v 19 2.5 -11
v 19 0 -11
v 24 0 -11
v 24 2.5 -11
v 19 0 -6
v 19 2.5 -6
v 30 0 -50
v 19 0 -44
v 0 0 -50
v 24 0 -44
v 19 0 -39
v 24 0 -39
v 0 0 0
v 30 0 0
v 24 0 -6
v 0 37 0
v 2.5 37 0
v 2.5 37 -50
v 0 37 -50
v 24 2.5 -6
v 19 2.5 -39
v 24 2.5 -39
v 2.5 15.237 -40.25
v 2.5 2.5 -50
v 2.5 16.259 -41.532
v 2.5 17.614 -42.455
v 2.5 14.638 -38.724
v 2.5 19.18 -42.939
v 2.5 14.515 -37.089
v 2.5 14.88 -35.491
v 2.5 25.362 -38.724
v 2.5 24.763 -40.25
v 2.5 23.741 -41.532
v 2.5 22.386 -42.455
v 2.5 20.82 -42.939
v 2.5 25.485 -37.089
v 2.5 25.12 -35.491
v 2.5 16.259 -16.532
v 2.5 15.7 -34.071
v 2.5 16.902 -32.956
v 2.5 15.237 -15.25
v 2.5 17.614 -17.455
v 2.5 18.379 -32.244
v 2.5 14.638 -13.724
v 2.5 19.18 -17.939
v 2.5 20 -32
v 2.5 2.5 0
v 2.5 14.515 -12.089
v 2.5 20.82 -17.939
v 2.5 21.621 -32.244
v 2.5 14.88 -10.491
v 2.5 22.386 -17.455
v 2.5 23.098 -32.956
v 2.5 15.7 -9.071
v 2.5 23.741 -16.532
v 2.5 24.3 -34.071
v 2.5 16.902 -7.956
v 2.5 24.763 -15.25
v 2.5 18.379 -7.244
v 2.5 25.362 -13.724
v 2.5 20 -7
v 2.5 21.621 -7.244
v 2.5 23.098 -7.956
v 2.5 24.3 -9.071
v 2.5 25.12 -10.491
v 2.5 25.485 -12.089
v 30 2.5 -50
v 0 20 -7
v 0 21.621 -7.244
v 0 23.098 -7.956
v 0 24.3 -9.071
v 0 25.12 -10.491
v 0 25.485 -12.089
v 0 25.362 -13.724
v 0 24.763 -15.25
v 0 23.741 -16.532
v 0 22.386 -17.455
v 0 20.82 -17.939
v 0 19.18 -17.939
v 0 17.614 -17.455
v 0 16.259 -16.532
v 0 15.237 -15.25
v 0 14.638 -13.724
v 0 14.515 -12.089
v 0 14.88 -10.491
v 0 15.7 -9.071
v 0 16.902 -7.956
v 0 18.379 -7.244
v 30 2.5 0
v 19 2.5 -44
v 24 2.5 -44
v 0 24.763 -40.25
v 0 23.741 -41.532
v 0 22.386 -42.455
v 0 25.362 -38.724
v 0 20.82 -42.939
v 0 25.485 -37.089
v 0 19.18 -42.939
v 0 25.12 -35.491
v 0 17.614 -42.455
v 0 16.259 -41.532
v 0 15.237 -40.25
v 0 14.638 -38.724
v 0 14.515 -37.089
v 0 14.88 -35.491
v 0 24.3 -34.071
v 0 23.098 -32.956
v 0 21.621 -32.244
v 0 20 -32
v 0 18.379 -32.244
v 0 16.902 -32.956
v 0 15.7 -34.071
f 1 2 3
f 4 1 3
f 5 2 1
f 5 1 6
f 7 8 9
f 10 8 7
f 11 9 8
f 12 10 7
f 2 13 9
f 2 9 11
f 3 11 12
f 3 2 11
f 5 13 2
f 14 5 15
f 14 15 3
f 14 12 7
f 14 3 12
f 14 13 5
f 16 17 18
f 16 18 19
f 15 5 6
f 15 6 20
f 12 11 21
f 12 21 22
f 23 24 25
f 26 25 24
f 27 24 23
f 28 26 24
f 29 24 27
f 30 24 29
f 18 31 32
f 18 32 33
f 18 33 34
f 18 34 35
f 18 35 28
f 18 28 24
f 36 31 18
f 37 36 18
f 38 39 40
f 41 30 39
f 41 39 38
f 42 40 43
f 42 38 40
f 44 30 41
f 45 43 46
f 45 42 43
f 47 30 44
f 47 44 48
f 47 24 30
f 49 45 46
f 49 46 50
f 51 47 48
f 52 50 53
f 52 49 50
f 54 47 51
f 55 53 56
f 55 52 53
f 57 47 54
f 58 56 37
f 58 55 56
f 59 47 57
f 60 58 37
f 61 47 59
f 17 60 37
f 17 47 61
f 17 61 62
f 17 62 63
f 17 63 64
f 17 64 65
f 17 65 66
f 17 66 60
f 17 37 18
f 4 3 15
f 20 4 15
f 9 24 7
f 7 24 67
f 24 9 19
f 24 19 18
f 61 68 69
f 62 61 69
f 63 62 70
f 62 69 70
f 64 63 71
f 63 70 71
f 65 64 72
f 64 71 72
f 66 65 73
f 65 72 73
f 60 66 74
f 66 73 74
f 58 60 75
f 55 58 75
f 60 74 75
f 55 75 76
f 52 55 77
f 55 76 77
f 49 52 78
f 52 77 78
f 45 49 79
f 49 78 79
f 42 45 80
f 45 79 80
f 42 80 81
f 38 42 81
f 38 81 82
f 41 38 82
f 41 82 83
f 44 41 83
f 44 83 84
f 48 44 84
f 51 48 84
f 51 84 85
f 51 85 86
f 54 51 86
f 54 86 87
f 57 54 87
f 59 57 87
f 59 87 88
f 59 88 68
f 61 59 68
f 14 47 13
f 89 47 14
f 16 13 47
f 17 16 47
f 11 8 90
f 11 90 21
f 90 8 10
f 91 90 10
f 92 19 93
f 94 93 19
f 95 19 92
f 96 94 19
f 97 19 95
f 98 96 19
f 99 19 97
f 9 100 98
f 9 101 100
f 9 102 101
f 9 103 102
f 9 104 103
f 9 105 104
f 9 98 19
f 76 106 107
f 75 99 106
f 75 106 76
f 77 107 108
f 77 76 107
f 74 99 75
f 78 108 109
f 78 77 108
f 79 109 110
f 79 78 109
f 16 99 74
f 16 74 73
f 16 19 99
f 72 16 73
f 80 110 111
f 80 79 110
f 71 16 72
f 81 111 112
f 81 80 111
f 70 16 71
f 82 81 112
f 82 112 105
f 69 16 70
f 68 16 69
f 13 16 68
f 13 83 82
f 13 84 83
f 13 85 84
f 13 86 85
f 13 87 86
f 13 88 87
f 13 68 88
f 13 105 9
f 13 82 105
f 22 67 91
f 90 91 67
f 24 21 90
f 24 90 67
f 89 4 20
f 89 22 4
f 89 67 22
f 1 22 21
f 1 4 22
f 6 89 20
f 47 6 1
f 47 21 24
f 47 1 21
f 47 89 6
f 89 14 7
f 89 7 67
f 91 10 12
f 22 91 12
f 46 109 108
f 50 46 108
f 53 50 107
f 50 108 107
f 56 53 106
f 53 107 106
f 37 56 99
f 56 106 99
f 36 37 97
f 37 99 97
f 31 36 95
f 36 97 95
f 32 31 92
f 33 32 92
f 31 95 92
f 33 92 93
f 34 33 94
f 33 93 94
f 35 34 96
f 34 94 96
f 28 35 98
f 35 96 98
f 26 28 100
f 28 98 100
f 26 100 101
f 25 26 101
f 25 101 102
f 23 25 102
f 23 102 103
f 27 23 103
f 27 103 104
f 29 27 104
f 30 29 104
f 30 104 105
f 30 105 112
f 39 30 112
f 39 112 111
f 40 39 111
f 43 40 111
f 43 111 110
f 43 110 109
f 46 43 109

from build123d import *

# Parameters (mm, degrees)
BOSS_EXTRUDE1_DEPTH = 50
SKETCH2_R           = 5.5
CUT_EXTRUDE1_DEPTH  = 70.057946682
SKETCH3_W           = 5
SKETCH3_H           = 5
CUT_EXTRUDE2_DEPTH  = 50


with BuildPart() as part:
    # Sketch1 → Boss-Extrude1 (new body)
    with BuildSketch(Plane.XY):
        Polygon((0, 4.805194805), (0, 0), (4.805194805, 0), (30, 0), (30, 2.5), (2.5, 2.5), (2.5, 37), (0, 37), align=None)
    extrude(amount=-BOSS_EXTRUDE1_DEPTH)

    # Sketch2 → Cut-Extrude1 (cut, through all)
    with BuildSketch(Plane.ZY):
        with Locations((-37.5, 20)):
            Circle(SKETCH2_R)
        with Locations((-12.5, 20)):
            Circle(SKETCH2_R)
    extrude(amount=-CUT_EXTRUDE1_DEPTH, mode=Mode.SUBTRACT)

    # Sketch3 → Cut-Extrude2 (cut)
    with BuildSketch(Plane.XZ):
        with Locations((21.5, -8.5)):
            Rectangle(SKETCH3_W, SKETCH3_H)
        with Locations((21.5, -41.5)):
            Rectangle(SKETCH3_W, SKETCH3_H)
    extrude(amount=-CUT_EXTRUDE2_DEPTH, mode=Mode.SUBTRACT)


solid = part.part
